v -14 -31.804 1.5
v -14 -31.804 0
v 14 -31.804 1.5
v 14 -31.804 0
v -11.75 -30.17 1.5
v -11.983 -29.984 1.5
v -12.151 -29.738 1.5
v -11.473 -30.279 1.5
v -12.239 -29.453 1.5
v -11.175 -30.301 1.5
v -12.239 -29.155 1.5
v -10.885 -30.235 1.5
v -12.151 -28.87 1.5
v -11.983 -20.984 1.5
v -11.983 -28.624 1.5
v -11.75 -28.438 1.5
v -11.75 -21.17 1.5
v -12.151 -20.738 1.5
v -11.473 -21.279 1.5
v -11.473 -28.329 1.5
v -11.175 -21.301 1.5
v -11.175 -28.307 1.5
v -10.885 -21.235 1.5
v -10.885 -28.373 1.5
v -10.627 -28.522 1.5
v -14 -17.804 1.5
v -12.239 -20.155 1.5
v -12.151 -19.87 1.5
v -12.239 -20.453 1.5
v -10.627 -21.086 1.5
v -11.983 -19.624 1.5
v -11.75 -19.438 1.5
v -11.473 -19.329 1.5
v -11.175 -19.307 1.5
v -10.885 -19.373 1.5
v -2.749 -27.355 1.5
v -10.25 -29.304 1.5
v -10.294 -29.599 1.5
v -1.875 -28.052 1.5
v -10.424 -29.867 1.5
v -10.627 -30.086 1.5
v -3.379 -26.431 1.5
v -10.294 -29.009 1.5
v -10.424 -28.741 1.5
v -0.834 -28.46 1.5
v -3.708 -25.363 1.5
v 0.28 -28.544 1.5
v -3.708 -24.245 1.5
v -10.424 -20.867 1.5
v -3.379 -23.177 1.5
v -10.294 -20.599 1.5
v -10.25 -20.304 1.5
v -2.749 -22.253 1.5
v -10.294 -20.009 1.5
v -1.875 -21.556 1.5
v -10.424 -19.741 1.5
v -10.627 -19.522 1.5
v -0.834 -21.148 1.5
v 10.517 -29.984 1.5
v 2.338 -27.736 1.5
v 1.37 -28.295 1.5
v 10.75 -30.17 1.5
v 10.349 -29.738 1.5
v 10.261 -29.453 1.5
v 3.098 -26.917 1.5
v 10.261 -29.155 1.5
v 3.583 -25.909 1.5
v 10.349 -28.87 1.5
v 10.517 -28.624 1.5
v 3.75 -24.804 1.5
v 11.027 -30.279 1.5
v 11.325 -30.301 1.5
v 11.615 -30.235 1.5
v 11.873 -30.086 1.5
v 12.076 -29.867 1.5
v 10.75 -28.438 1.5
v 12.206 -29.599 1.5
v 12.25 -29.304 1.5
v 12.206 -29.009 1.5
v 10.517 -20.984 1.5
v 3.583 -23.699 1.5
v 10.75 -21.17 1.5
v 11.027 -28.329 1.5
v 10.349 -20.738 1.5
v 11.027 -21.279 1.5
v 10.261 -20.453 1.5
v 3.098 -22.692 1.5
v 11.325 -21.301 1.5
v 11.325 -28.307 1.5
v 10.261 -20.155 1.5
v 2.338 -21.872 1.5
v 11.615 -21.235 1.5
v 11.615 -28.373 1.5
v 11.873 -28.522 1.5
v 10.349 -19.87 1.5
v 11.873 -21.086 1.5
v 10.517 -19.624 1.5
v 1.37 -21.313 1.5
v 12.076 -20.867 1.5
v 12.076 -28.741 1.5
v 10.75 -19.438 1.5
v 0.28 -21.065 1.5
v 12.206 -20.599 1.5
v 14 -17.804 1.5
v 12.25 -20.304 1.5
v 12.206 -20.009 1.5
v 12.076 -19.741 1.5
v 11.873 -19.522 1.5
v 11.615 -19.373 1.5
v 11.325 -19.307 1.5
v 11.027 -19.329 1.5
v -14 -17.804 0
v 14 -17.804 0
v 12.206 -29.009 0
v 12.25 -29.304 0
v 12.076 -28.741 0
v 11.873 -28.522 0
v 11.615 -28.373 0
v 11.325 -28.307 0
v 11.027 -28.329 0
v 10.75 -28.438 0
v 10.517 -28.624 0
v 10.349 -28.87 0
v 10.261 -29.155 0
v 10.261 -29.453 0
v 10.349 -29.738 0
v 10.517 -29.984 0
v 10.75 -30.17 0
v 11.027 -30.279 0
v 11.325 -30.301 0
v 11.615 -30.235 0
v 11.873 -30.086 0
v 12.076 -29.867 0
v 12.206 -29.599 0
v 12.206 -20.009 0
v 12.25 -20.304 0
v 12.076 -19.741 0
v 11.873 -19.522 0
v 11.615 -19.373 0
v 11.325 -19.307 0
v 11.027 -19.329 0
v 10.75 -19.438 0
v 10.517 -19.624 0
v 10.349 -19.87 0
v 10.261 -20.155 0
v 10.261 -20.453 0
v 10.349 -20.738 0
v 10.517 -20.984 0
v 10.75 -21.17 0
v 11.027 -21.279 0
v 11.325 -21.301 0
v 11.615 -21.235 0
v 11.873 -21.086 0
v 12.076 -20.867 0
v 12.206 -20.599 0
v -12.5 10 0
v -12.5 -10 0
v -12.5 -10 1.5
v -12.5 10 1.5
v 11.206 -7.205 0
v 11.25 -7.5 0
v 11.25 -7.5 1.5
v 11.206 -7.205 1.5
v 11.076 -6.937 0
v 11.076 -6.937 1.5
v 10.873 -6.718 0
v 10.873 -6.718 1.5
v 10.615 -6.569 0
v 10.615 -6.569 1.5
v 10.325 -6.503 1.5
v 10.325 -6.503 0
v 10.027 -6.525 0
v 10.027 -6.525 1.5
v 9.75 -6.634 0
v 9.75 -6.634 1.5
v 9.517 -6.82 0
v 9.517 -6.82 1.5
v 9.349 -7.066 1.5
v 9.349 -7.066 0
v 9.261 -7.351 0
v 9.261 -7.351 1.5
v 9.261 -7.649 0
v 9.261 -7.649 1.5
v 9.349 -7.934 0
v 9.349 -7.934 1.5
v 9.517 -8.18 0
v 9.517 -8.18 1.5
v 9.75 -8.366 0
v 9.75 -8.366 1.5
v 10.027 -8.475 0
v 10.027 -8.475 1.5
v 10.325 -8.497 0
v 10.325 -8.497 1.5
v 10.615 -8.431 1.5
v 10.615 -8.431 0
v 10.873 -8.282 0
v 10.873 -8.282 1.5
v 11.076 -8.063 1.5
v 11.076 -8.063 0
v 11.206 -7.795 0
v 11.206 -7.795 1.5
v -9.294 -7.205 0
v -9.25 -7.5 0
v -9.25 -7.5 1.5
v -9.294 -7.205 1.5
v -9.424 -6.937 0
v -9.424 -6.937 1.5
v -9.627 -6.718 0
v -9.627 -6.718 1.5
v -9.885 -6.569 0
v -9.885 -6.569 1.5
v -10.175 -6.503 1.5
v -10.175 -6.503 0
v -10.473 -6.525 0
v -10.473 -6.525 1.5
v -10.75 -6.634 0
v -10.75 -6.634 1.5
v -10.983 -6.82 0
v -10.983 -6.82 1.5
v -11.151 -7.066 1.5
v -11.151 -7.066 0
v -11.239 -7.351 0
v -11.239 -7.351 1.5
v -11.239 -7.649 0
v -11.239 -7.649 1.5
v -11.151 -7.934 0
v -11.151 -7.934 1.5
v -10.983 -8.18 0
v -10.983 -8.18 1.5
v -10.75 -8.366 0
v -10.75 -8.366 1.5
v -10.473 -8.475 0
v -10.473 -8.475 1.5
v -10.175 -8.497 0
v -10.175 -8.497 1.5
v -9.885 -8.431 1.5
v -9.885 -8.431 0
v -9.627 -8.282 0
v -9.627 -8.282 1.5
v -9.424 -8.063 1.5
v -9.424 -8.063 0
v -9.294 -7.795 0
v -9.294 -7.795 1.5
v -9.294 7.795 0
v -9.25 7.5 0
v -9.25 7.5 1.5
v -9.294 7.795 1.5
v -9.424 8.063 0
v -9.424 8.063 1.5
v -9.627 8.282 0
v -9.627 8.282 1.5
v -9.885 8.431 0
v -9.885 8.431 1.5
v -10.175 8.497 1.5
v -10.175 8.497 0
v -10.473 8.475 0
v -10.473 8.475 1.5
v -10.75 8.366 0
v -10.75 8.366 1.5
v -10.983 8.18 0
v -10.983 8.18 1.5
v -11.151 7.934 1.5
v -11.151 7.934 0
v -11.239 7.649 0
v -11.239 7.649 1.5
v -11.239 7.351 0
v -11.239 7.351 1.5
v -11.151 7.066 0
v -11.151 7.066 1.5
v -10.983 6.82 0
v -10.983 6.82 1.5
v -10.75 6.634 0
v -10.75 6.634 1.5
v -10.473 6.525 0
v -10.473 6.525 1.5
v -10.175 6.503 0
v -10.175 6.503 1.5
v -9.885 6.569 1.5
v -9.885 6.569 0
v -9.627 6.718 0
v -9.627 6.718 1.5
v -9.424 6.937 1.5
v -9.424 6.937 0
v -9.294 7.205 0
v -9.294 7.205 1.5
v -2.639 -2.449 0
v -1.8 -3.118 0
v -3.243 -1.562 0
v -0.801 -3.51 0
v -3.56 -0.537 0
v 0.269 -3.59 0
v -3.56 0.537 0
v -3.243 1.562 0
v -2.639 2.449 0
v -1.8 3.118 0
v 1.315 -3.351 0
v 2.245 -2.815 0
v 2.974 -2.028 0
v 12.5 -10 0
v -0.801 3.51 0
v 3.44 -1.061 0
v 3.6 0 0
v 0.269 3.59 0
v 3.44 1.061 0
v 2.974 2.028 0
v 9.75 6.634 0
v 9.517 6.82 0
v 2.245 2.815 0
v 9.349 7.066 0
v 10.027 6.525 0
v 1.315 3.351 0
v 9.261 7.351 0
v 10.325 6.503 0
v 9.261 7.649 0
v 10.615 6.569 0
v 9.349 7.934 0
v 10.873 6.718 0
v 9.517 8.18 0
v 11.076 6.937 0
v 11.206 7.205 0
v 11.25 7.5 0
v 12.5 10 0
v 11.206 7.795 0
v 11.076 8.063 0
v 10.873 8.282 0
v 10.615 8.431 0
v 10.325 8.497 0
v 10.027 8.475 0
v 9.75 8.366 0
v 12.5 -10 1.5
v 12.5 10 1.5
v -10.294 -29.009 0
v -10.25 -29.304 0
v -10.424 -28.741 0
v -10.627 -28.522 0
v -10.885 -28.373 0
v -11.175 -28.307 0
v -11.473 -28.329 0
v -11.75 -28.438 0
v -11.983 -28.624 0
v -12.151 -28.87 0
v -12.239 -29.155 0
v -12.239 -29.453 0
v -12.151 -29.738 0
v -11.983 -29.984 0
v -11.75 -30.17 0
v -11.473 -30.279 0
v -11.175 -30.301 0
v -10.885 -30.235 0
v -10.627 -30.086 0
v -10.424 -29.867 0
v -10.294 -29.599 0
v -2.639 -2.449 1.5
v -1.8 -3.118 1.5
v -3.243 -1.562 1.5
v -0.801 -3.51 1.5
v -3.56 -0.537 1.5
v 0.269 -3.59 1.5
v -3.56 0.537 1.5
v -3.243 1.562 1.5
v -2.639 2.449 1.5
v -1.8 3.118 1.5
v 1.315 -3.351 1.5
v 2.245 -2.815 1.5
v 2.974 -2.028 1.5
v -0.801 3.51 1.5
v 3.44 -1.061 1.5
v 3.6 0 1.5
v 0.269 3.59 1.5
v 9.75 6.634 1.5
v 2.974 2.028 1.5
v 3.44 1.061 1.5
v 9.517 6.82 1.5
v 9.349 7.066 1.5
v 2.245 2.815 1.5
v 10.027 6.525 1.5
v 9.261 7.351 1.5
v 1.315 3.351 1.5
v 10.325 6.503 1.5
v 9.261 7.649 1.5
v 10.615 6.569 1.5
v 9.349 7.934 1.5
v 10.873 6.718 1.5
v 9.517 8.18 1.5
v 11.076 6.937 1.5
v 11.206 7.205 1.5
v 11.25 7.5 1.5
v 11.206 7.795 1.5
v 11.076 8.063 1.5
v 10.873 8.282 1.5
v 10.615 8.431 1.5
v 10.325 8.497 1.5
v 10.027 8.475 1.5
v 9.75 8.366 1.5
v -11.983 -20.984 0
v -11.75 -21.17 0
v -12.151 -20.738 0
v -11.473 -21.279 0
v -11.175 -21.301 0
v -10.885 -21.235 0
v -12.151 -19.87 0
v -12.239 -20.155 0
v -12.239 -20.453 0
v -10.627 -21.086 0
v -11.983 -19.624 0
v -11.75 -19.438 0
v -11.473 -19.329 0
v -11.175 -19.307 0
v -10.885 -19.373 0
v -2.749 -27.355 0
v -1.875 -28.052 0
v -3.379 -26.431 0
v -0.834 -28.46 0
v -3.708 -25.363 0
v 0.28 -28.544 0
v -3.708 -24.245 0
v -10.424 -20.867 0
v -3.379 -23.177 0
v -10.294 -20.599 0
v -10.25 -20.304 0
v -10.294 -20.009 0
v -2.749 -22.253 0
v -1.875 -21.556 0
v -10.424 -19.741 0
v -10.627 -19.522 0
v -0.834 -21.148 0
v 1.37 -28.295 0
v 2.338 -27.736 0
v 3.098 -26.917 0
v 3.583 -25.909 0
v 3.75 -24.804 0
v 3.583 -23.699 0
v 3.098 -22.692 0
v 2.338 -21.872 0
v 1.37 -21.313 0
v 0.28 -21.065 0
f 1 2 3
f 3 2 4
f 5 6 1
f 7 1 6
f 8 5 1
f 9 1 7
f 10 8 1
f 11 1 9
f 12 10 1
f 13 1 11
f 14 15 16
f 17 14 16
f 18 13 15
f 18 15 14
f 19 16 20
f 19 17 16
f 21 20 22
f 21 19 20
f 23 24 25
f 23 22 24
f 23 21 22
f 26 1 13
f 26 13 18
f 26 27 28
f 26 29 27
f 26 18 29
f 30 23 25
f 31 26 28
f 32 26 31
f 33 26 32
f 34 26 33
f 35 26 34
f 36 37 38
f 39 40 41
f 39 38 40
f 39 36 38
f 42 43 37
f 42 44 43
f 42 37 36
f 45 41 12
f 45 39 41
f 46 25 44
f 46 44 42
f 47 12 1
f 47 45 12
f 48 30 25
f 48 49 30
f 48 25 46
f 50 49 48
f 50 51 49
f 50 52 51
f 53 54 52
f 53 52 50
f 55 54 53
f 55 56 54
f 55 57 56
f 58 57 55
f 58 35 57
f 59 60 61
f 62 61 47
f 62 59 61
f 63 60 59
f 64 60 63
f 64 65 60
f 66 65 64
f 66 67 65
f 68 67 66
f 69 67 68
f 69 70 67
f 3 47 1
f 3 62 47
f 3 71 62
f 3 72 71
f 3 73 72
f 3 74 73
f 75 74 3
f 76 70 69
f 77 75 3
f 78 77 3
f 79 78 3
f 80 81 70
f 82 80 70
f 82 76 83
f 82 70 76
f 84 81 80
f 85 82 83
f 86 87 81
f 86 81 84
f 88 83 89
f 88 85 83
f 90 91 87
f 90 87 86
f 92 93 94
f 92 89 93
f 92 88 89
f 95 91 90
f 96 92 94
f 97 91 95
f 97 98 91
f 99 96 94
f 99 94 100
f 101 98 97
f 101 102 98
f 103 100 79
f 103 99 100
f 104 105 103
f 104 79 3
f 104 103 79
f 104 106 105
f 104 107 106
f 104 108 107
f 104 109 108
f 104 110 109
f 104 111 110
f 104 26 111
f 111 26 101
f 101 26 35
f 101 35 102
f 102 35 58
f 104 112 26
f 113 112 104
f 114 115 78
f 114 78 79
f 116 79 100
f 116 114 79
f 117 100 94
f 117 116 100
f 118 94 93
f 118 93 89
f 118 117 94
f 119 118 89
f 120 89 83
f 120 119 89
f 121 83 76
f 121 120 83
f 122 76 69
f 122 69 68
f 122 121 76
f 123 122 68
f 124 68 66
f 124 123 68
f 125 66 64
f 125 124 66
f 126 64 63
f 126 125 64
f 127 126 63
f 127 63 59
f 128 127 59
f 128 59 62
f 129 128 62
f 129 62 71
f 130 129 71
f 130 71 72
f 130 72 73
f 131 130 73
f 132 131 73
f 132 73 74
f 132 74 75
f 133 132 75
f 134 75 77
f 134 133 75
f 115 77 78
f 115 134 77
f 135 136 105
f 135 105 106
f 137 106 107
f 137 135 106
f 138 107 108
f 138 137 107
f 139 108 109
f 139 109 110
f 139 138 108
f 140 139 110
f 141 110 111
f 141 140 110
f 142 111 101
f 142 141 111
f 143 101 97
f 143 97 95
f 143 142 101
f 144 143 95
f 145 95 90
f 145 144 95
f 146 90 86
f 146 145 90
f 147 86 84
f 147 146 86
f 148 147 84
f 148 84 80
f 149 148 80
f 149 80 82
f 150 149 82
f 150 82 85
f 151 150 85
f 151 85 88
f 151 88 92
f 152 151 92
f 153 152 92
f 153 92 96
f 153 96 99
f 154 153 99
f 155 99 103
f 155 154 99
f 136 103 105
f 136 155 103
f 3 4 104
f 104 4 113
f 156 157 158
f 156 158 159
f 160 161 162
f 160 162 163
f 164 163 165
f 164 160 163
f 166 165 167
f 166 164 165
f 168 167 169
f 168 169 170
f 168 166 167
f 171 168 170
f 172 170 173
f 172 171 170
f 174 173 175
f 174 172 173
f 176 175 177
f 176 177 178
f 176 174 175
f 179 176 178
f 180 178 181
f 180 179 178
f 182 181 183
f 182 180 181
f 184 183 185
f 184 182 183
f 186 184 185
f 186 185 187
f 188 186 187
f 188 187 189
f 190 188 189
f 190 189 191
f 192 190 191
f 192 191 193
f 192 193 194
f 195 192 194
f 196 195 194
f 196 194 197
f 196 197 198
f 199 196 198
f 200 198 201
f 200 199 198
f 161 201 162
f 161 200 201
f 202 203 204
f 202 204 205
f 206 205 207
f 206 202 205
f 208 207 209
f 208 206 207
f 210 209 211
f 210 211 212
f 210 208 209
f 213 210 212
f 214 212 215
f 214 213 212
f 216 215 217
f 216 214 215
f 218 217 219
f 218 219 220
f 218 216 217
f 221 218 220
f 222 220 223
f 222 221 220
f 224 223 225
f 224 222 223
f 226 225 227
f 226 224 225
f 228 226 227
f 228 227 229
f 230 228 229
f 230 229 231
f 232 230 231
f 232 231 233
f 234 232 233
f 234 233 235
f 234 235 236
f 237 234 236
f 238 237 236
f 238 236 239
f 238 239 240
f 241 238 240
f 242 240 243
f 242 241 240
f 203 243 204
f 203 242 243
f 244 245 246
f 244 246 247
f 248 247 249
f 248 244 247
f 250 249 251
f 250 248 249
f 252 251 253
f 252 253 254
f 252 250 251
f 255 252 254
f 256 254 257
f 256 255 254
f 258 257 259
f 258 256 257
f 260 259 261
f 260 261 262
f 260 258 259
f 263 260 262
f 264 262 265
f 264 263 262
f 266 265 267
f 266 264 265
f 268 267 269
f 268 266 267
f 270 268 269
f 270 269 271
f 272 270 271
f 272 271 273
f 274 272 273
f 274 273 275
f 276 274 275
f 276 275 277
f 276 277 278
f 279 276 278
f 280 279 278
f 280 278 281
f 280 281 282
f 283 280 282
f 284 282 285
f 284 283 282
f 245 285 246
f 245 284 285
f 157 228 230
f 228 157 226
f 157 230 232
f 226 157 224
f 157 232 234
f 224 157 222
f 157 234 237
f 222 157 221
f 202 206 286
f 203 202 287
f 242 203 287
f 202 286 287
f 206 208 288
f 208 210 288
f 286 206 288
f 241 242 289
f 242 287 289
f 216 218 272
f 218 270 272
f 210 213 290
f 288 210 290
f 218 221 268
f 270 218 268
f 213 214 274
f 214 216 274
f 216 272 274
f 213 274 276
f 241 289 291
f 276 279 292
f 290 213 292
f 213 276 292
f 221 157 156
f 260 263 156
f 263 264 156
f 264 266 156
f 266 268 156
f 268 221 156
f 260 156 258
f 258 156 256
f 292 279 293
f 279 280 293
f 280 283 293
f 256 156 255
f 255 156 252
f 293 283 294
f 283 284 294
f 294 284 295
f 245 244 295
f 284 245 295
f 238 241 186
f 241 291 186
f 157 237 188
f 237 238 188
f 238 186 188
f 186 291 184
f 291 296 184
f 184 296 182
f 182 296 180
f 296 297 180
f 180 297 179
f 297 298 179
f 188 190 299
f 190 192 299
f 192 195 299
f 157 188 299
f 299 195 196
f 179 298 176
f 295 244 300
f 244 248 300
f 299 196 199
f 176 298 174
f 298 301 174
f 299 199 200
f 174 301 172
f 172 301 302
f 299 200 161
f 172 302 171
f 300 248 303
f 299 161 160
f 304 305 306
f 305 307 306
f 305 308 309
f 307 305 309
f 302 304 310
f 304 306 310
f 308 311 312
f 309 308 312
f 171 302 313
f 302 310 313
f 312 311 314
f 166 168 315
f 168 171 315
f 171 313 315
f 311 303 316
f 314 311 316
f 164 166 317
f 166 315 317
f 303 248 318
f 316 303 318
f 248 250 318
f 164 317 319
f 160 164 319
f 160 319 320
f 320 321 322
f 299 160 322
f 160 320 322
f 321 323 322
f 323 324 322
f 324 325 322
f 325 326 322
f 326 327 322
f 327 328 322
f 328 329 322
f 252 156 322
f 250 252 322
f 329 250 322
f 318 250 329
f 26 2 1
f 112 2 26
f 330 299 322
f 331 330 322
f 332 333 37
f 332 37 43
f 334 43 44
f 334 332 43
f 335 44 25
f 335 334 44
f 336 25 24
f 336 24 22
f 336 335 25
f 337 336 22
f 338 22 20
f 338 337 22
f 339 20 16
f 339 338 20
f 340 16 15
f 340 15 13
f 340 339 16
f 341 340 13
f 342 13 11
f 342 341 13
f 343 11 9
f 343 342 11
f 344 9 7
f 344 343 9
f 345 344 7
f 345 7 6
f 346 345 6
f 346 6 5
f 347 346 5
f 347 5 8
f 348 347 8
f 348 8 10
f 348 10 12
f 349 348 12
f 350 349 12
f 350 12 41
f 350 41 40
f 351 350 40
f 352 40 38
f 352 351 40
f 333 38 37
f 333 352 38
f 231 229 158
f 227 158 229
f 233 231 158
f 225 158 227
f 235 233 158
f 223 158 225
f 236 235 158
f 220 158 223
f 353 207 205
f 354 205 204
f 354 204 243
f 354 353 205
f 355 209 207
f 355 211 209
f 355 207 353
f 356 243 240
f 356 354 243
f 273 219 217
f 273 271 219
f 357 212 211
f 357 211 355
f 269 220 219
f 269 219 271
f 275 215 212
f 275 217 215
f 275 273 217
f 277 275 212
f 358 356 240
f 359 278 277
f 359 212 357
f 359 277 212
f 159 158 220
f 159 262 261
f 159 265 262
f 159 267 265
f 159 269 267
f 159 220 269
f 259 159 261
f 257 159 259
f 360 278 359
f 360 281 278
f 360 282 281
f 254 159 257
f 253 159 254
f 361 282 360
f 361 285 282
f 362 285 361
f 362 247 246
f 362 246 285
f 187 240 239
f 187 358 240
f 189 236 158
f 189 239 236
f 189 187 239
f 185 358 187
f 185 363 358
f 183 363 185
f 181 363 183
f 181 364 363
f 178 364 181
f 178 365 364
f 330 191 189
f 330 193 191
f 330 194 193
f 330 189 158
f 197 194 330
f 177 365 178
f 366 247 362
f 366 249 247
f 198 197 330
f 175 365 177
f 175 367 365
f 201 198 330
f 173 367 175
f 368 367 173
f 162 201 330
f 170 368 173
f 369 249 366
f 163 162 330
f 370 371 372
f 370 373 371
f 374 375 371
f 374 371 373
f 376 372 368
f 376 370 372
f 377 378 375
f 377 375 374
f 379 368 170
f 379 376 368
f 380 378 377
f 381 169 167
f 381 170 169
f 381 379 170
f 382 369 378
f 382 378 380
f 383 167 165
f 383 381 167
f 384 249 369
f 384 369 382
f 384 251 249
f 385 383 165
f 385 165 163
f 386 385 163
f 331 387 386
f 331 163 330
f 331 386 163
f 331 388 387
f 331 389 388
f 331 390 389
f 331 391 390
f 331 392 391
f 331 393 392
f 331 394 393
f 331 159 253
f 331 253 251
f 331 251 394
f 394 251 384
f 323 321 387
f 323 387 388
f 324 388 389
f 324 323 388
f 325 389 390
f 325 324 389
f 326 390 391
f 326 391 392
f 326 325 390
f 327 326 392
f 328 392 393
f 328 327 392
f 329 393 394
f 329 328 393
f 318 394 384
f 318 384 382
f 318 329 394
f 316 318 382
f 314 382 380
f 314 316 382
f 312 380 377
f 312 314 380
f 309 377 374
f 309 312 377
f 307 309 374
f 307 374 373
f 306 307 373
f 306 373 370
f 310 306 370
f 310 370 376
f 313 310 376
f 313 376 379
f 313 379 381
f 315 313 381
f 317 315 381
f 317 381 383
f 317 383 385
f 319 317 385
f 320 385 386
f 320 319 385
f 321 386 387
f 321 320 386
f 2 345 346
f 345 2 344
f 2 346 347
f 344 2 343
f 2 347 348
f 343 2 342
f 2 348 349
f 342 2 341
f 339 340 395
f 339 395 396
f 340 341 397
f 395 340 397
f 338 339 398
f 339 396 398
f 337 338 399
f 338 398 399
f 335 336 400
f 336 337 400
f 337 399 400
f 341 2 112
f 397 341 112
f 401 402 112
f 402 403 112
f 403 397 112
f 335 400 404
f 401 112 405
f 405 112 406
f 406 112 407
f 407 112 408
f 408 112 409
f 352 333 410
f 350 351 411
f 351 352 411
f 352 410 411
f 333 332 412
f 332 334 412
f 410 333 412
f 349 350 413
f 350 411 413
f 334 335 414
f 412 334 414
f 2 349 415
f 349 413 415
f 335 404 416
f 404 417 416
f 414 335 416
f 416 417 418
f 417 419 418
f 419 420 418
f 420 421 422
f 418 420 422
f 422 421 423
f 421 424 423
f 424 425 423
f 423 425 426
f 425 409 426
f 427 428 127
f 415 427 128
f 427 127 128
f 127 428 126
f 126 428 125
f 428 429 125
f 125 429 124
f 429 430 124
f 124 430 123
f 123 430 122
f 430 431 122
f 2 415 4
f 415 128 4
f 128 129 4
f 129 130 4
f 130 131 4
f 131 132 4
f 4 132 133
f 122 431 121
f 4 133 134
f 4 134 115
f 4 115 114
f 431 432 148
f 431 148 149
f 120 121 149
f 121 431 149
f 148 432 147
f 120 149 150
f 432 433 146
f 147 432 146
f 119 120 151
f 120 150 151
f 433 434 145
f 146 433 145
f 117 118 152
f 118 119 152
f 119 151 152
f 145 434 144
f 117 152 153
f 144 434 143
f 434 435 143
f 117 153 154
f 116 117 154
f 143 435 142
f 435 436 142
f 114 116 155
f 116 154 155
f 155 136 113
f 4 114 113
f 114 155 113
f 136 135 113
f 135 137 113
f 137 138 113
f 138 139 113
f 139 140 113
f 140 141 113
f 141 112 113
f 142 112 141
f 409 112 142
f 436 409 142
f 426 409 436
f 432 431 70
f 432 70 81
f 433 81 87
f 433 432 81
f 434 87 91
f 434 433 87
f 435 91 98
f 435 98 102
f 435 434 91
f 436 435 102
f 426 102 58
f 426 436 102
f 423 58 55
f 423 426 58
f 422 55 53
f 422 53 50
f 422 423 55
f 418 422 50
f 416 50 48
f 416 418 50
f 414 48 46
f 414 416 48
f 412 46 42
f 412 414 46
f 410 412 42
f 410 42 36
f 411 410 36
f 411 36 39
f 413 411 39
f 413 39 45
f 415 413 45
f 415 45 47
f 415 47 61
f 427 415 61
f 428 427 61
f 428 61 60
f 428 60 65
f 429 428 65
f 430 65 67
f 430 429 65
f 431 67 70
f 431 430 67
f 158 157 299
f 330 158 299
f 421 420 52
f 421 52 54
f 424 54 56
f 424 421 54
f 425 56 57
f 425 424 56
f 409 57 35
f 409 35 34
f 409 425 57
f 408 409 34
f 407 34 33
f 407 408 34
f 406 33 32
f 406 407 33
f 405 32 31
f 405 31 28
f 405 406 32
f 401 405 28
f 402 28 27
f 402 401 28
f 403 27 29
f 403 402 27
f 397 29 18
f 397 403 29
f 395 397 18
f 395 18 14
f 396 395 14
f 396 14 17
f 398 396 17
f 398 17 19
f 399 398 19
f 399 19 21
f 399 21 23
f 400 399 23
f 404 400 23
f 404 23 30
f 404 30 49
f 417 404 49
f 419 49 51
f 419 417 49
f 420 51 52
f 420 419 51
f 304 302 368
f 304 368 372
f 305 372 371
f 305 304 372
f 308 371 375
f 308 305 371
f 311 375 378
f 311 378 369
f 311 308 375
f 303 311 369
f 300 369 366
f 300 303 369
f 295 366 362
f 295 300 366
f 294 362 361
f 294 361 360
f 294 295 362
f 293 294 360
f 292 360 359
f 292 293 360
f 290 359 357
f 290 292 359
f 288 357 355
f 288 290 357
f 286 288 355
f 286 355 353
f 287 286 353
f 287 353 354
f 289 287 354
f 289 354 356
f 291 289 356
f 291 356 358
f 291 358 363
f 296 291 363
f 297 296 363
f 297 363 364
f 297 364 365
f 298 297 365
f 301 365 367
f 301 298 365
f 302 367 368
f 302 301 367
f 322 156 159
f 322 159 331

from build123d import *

# Parameters (mm, degrees)
F0_W     = 25
F0_H     = 20
F0_R     = 1
F0_R_2   = 3.6
F1_DEPTH = 1.5
F2_W     = 28
F2_H     = 14
F2_R     = 1
F2_R_2   = 3.75
F3_DEPTH = 1.5


with BuildPart() as f1:
    # F0 (on Top) → F1 (new body)
    with BuildSketch(Plane.XY):
        Rectangle(F0_W, F0_H)
        with Locations((-10.25, -7.5)):
            Circle(F0_R, mode=Mode.SUBTRACT)
        with Locations((10.25, -7.5)):
            Circle(F0_R, mode=Mode.SUBTRACT)
        with Locations((-10.25, 7.5)):
            Circle(F0_R, mode=Mode.SUBTRACT)
        Circle(F0_R_2, mode=Mode.SUBTRACT)
        with Locations((10.25, 7.5)):
            Circle(F0_R, mode=Mode.SUBTRACT)
    extrude(amount=F1_DEPTH)


with BuildPart() as f3:
    # F2 (on Top) → F3 (new body)
    with BuildSketch(Plane.XY):
        with Locations((0, -24.804085)):
            Rectangle(F2_W, F2_H)
        with Locations((-11.25, -29.304085)):
            Circle(F2_R, mode=Mode.SUBTRACT)
        with Locations((11.25, -29.304085)):
            Circle(F2_R, mode=Mode.SUBTRACT)
        with Locations((-11.25, -20.304085)):
            Circle(F2_R, mode=Mode.SUBTRACT)
        with Locations((0, -24.804085)):
            Circle(F2_R_2, mode=Mode.SUBTRACT)
        with Locations((11.25, -20.304085)):
            Circle(F2_R, mode=Mode.SUBTRACT)
    extrude(amount=F3_DEPTH)


solid = Compound([f1.part, f3.part])
